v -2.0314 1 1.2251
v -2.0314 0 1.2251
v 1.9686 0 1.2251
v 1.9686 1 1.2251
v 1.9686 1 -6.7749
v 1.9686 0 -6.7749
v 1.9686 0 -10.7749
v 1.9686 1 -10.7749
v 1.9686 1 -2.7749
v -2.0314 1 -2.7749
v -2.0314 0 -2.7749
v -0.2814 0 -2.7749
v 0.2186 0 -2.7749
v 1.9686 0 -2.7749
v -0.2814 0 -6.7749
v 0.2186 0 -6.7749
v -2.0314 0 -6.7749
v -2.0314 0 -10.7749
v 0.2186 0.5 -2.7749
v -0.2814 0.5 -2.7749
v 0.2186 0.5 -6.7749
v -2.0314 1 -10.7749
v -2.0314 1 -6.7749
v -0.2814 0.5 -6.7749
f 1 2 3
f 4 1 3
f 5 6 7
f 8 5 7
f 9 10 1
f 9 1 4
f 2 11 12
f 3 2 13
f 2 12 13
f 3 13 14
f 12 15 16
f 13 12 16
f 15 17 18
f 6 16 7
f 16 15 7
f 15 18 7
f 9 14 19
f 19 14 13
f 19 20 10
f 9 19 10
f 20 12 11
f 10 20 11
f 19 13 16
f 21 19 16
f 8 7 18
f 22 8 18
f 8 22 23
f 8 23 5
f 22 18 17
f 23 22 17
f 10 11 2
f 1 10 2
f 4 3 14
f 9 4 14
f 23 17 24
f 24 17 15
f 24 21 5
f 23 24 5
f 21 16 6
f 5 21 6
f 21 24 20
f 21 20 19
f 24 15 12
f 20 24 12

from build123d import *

# Parameters (mm, degrees)
BOSS_EXTRUDE1_DEPTH = 1
SKETCH4_W           = 0.5
SKETCH4_H           = 4
CUT_EXTRUDE1_DEPTH  = 0.5


with BuildPart() as part:
    # Sketch3 → Boss-Extrude1 (new body)
    with BuildSketch(Plane(origin=(0, 0, 0), x_dir=(1, 0, 0), z_dir=(0, 1, 0))):
        Polygon((-2.031413613, 2.77486911), (-2.031413613, -1.22513089), (1.968586387, -1.22513089), (1.968586387, 2.77486911), (0.218586387, 2.77486911), (0.218586387, 6.77486911), (1.968586387, 6.77486911), (1.968586387, 10.77486911), (-2.031413613, 10.77486911), (-2.031413613, 6.77486911), (-0.281413613, 6.77486911), (-0.281413613, 2.77486911), align=None)
    extrude(amount=BOSS_EXTRUDE1_DEPTH)

    # Sketch4 → Cut-Extrude1 (cut)
    with BuildSketch(Plane(origin=(0, 1, 0), x_dir=(1, 0, 0), z_dir=(0, 1, 0))):
        with Locations((-0.031413613, 4.77486911)):
            Rectangle(SKETCH4_W, SKETCH4_H)
    extrude(amount=-CUT_EXTRUDE1_DEPTH, mode=Mode.SUBTRACT)


solid = part.part
